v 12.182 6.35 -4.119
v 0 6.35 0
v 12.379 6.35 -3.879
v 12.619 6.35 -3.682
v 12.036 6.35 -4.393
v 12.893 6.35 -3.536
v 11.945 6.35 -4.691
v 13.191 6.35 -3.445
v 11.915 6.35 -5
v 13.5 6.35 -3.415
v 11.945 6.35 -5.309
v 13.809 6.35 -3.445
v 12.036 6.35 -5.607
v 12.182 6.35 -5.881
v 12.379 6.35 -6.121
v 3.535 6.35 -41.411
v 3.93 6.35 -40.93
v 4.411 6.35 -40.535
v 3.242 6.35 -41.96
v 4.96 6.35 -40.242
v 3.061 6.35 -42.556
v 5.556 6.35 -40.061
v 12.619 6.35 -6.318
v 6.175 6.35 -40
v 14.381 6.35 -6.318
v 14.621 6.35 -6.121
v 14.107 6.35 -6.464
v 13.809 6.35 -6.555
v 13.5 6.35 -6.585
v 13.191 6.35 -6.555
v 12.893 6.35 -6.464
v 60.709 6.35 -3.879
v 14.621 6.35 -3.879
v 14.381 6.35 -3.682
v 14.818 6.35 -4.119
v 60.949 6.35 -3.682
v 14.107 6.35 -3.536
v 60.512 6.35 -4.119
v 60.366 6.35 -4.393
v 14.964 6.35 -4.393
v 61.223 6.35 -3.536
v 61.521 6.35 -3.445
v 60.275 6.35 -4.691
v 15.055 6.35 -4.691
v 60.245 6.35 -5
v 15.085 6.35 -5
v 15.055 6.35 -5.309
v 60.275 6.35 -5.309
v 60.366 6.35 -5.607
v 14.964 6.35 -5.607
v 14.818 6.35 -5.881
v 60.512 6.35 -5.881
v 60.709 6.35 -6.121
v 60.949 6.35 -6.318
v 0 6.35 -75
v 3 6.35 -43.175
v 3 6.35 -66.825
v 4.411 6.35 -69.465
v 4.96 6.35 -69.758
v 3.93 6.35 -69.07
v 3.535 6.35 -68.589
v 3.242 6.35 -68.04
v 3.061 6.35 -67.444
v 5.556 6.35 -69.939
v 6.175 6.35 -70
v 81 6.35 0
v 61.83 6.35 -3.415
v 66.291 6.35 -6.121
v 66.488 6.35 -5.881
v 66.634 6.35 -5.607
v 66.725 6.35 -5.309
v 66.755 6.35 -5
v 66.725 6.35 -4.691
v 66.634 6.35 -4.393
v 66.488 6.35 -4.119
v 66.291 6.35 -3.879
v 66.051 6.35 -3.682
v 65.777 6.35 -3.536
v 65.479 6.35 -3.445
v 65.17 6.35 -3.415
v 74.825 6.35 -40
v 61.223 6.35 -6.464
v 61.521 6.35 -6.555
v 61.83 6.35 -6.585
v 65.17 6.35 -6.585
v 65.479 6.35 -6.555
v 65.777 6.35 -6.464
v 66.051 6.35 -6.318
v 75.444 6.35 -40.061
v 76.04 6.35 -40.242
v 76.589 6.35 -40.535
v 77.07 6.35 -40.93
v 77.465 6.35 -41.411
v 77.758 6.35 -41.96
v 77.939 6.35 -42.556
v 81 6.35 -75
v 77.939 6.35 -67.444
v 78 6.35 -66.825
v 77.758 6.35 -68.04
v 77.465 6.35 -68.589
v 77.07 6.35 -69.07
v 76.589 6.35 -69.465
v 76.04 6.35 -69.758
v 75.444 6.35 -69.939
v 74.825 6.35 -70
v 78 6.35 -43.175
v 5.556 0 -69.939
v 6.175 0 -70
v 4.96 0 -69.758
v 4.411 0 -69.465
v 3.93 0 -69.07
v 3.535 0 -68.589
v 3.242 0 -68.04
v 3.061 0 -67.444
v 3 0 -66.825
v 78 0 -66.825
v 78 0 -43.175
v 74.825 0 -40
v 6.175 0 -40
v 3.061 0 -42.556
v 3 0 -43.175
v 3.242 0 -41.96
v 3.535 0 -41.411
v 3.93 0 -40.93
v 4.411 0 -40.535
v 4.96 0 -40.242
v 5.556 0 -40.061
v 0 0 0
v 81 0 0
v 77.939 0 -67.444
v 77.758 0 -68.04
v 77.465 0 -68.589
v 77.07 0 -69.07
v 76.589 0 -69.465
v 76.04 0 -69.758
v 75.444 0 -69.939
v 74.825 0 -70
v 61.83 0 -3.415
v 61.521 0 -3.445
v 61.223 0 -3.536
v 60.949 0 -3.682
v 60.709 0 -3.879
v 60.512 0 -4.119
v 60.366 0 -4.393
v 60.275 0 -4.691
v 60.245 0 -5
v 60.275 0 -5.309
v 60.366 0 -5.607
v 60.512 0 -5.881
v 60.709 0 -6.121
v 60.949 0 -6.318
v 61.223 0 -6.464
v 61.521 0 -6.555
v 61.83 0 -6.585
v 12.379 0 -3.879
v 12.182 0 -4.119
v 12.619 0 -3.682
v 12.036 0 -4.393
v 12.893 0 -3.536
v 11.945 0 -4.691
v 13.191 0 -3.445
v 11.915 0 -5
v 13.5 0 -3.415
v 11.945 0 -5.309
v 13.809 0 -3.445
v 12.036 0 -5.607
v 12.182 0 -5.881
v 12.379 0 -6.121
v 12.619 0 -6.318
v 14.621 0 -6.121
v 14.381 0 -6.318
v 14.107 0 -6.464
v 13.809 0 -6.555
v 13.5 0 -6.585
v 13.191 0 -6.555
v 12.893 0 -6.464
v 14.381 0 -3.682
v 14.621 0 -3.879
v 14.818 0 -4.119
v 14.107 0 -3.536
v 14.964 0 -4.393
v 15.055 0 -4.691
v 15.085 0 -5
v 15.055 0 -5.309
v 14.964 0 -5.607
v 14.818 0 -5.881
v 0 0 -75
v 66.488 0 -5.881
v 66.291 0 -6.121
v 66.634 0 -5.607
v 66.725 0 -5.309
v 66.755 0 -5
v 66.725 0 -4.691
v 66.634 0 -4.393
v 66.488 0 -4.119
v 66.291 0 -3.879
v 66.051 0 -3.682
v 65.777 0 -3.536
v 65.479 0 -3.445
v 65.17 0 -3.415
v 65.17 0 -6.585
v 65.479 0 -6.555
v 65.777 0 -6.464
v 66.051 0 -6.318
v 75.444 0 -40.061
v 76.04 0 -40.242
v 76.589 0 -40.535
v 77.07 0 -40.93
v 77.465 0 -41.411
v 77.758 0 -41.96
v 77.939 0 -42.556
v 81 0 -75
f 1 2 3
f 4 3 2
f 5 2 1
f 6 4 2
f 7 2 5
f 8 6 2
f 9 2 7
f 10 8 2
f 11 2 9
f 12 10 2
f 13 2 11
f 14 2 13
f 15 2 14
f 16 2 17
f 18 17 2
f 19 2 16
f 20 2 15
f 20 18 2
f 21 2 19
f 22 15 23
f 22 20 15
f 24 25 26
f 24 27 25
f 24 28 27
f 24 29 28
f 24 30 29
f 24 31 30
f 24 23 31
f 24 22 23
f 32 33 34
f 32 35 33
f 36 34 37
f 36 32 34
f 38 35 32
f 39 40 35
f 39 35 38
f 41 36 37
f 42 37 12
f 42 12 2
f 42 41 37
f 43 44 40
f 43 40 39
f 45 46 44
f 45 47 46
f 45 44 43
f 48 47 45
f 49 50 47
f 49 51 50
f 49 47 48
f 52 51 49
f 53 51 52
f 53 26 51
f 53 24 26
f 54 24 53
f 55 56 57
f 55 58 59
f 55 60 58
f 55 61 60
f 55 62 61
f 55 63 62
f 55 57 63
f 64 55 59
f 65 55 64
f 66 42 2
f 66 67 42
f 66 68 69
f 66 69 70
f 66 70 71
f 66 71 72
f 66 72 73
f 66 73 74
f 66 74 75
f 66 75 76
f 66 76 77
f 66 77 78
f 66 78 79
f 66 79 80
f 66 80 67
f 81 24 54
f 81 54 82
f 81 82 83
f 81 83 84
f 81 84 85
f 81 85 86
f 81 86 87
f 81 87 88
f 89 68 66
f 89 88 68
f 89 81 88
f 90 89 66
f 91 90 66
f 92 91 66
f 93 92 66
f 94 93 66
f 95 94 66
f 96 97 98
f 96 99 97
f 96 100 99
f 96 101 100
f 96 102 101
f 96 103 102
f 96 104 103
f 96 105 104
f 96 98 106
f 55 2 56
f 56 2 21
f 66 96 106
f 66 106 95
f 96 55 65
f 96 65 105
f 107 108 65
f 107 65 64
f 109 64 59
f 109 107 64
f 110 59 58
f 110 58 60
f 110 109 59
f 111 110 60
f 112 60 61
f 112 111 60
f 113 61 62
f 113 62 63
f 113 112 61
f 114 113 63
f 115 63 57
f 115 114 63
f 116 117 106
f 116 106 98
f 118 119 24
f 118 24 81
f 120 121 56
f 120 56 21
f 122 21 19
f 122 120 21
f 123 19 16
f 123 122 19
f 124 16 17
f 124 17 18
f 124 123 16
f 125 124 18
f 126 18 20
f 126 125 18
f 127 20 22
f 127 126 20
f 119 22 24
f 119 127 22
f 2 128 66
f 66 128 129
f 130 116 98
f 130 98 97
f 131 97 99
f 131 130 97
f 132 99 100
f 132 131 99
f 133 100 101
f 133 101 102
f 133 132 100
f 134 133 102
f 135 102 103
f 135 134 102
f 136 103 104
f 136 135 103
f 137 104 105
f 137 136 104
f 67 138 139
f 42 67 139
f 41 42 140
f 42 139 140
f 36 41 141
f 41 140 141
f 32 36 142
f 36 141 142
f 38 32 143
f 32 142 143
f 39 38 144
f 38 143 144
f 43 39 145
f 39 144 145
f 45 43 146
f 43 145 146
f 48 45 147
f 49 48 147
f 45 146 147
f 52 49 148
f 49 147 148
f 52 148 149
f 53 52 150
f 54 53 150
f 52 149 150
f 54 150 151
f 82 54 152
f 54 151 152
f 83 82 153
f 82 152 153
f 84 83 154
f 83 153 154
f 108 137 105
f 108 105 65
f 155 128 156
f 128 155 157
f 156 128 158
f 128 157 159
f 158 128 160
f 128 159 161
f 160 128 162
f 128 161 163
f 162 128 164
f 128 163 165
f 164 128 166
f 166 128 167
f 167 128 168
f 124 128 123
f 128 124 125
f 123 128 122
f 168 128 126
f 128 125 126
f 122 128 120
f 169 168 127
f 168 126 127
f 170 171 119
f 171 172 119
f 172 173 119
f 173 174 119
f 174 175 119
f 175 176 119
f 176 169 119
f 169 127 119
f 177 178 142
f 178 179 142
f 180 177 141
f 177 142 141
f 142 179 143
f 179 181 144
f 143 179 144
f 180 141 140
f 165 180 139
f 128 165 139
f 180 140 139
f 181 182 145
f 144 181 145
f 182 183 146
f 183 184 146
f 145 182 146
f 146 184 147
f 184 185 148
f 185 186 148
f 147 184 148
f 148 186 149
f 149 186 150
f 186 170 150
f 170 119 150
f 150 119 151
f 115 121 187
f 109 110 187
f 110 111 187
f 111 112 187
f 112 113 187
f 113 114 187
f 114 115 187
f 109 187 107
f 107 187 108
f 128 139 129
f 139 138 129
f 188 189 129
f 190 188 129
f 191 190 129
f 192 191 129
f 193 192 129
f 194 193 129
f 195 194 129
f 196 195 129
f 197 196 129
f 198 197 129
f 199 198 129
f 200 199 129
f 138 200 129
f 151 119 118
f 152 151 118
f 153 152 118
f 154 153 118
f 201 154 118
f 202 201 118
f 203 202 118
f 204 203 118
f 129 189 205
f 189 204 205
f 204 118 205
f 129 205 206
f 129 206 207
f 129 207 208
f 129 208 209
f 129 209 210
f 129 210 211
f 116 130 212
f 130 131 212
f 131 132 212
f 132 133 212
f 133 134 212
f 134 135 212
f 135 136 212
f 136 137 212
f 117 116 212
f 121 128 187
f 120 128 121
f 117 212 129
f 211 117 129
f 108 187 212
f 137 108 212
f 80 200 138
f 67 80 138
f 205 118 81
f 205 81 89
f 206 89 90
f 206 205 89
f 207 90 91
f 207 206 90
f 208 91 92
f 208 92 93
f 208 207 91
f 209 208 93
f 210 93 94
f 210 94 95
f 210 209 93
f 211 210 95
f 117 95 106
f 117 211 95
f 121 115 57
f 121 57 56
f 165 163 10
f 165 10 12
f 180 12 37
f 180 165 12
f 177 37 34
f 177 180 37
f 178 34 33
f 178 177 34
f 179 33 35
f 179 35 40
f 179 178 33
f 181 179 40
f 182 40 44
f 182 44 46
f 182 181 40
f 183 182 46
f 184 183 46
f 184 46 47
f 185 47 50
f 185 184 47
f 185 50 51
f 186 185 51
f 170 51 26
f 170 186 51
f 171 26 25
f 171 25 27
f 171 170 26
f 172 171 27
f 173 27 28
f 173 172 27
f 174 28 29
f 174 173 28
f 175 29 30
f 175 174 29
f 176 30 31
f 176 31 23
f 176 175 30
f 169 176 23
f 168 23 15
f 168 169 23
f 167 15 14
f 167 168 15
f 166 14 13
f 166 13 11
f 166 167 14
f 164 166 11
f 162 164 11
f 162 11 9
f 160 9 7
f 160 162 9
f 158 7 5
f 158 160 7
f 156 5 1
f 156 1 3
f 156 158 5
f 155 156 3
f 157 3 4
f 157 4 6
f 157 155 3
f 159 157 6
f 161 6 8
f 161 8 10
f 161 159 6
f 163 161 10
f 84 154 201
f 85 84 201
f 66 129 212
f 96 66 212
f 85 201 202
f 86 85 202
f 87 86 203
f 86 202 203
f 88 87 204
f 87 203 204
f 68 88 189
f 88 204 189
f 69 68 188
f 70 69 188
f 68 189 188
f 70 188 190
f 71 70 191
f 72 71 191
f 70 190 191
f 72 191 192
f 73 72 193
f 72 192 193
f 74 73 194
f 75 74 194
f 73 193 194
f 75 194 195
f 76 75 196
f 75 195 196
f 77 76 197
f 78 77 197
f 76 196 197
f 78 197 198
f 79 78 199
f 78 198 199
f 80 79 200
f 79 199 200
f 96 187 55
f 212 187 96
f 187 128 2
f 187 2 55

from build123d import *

# Parameters (mm, degrees)
SKETCH1_W           = 81
SKETCH1_H           = 75
SKETCH1_R           = 1.585
BOSS_EXTRUDE1_DEPTH = 6.35


with BuildPart() as part:
    # Sketch1 → Boss-Extrude1 (new body)
    with BuildSketch(Plane(origin=(0, 0, 0), x_dir=(1, 0, 0), z_dir=(0, 1, 0))):
        with Locations((40.5, 37.5)):
            Rectangle(SKETCH1_W, SKETCH1_H)
        with Locations(Location((13.5, 5, 0), (0, 0, 270))):  # turned: the seam where the file's is
            Circle(SKETCH1_R, mode=Mode.SUBTRACT)
        with BuildLine():
            Line((6.175, 40), (74.825, 40))
            ThreePointArc((74.825, 40), (77.07006403, 40.92993597), (78, 43.175))
            Line((78, 43.175), (78, 66.825))
            ThreePointArc((78, 66.825), (77.07006403, 69.07006403), (74.825, 70))
            Line((74.825, 70), (6.175, 70))
            ThreePointArc((6.175, 70), (3.92993597, 69.07006403), (3, 66.825))
            Line((3, 66.825), (3, 43.175))
            ThreePointArc((3, 43.175), (3.92993597, 40.92993597), (6.175, 40))
        make_face(mode=Mode.SUBTRACT)
        with BuildLine():
            Line((61.83, 6.585), (65.17, 6.585))
            ThreePointArc((65.17, 6.585), (66.755, 5), (65.17, 3.415))
            Line((65.17, 3.415), (61.83, 3.415))
            ThreePointArc((61.83, 3.415), (60.245, 5), (61.83, 6.585))
        make_face(mode=Mode.SUBTRACT)
    extrude(amount=BOSS_EXTRUDE1_DEPTH)


solid = part.part
